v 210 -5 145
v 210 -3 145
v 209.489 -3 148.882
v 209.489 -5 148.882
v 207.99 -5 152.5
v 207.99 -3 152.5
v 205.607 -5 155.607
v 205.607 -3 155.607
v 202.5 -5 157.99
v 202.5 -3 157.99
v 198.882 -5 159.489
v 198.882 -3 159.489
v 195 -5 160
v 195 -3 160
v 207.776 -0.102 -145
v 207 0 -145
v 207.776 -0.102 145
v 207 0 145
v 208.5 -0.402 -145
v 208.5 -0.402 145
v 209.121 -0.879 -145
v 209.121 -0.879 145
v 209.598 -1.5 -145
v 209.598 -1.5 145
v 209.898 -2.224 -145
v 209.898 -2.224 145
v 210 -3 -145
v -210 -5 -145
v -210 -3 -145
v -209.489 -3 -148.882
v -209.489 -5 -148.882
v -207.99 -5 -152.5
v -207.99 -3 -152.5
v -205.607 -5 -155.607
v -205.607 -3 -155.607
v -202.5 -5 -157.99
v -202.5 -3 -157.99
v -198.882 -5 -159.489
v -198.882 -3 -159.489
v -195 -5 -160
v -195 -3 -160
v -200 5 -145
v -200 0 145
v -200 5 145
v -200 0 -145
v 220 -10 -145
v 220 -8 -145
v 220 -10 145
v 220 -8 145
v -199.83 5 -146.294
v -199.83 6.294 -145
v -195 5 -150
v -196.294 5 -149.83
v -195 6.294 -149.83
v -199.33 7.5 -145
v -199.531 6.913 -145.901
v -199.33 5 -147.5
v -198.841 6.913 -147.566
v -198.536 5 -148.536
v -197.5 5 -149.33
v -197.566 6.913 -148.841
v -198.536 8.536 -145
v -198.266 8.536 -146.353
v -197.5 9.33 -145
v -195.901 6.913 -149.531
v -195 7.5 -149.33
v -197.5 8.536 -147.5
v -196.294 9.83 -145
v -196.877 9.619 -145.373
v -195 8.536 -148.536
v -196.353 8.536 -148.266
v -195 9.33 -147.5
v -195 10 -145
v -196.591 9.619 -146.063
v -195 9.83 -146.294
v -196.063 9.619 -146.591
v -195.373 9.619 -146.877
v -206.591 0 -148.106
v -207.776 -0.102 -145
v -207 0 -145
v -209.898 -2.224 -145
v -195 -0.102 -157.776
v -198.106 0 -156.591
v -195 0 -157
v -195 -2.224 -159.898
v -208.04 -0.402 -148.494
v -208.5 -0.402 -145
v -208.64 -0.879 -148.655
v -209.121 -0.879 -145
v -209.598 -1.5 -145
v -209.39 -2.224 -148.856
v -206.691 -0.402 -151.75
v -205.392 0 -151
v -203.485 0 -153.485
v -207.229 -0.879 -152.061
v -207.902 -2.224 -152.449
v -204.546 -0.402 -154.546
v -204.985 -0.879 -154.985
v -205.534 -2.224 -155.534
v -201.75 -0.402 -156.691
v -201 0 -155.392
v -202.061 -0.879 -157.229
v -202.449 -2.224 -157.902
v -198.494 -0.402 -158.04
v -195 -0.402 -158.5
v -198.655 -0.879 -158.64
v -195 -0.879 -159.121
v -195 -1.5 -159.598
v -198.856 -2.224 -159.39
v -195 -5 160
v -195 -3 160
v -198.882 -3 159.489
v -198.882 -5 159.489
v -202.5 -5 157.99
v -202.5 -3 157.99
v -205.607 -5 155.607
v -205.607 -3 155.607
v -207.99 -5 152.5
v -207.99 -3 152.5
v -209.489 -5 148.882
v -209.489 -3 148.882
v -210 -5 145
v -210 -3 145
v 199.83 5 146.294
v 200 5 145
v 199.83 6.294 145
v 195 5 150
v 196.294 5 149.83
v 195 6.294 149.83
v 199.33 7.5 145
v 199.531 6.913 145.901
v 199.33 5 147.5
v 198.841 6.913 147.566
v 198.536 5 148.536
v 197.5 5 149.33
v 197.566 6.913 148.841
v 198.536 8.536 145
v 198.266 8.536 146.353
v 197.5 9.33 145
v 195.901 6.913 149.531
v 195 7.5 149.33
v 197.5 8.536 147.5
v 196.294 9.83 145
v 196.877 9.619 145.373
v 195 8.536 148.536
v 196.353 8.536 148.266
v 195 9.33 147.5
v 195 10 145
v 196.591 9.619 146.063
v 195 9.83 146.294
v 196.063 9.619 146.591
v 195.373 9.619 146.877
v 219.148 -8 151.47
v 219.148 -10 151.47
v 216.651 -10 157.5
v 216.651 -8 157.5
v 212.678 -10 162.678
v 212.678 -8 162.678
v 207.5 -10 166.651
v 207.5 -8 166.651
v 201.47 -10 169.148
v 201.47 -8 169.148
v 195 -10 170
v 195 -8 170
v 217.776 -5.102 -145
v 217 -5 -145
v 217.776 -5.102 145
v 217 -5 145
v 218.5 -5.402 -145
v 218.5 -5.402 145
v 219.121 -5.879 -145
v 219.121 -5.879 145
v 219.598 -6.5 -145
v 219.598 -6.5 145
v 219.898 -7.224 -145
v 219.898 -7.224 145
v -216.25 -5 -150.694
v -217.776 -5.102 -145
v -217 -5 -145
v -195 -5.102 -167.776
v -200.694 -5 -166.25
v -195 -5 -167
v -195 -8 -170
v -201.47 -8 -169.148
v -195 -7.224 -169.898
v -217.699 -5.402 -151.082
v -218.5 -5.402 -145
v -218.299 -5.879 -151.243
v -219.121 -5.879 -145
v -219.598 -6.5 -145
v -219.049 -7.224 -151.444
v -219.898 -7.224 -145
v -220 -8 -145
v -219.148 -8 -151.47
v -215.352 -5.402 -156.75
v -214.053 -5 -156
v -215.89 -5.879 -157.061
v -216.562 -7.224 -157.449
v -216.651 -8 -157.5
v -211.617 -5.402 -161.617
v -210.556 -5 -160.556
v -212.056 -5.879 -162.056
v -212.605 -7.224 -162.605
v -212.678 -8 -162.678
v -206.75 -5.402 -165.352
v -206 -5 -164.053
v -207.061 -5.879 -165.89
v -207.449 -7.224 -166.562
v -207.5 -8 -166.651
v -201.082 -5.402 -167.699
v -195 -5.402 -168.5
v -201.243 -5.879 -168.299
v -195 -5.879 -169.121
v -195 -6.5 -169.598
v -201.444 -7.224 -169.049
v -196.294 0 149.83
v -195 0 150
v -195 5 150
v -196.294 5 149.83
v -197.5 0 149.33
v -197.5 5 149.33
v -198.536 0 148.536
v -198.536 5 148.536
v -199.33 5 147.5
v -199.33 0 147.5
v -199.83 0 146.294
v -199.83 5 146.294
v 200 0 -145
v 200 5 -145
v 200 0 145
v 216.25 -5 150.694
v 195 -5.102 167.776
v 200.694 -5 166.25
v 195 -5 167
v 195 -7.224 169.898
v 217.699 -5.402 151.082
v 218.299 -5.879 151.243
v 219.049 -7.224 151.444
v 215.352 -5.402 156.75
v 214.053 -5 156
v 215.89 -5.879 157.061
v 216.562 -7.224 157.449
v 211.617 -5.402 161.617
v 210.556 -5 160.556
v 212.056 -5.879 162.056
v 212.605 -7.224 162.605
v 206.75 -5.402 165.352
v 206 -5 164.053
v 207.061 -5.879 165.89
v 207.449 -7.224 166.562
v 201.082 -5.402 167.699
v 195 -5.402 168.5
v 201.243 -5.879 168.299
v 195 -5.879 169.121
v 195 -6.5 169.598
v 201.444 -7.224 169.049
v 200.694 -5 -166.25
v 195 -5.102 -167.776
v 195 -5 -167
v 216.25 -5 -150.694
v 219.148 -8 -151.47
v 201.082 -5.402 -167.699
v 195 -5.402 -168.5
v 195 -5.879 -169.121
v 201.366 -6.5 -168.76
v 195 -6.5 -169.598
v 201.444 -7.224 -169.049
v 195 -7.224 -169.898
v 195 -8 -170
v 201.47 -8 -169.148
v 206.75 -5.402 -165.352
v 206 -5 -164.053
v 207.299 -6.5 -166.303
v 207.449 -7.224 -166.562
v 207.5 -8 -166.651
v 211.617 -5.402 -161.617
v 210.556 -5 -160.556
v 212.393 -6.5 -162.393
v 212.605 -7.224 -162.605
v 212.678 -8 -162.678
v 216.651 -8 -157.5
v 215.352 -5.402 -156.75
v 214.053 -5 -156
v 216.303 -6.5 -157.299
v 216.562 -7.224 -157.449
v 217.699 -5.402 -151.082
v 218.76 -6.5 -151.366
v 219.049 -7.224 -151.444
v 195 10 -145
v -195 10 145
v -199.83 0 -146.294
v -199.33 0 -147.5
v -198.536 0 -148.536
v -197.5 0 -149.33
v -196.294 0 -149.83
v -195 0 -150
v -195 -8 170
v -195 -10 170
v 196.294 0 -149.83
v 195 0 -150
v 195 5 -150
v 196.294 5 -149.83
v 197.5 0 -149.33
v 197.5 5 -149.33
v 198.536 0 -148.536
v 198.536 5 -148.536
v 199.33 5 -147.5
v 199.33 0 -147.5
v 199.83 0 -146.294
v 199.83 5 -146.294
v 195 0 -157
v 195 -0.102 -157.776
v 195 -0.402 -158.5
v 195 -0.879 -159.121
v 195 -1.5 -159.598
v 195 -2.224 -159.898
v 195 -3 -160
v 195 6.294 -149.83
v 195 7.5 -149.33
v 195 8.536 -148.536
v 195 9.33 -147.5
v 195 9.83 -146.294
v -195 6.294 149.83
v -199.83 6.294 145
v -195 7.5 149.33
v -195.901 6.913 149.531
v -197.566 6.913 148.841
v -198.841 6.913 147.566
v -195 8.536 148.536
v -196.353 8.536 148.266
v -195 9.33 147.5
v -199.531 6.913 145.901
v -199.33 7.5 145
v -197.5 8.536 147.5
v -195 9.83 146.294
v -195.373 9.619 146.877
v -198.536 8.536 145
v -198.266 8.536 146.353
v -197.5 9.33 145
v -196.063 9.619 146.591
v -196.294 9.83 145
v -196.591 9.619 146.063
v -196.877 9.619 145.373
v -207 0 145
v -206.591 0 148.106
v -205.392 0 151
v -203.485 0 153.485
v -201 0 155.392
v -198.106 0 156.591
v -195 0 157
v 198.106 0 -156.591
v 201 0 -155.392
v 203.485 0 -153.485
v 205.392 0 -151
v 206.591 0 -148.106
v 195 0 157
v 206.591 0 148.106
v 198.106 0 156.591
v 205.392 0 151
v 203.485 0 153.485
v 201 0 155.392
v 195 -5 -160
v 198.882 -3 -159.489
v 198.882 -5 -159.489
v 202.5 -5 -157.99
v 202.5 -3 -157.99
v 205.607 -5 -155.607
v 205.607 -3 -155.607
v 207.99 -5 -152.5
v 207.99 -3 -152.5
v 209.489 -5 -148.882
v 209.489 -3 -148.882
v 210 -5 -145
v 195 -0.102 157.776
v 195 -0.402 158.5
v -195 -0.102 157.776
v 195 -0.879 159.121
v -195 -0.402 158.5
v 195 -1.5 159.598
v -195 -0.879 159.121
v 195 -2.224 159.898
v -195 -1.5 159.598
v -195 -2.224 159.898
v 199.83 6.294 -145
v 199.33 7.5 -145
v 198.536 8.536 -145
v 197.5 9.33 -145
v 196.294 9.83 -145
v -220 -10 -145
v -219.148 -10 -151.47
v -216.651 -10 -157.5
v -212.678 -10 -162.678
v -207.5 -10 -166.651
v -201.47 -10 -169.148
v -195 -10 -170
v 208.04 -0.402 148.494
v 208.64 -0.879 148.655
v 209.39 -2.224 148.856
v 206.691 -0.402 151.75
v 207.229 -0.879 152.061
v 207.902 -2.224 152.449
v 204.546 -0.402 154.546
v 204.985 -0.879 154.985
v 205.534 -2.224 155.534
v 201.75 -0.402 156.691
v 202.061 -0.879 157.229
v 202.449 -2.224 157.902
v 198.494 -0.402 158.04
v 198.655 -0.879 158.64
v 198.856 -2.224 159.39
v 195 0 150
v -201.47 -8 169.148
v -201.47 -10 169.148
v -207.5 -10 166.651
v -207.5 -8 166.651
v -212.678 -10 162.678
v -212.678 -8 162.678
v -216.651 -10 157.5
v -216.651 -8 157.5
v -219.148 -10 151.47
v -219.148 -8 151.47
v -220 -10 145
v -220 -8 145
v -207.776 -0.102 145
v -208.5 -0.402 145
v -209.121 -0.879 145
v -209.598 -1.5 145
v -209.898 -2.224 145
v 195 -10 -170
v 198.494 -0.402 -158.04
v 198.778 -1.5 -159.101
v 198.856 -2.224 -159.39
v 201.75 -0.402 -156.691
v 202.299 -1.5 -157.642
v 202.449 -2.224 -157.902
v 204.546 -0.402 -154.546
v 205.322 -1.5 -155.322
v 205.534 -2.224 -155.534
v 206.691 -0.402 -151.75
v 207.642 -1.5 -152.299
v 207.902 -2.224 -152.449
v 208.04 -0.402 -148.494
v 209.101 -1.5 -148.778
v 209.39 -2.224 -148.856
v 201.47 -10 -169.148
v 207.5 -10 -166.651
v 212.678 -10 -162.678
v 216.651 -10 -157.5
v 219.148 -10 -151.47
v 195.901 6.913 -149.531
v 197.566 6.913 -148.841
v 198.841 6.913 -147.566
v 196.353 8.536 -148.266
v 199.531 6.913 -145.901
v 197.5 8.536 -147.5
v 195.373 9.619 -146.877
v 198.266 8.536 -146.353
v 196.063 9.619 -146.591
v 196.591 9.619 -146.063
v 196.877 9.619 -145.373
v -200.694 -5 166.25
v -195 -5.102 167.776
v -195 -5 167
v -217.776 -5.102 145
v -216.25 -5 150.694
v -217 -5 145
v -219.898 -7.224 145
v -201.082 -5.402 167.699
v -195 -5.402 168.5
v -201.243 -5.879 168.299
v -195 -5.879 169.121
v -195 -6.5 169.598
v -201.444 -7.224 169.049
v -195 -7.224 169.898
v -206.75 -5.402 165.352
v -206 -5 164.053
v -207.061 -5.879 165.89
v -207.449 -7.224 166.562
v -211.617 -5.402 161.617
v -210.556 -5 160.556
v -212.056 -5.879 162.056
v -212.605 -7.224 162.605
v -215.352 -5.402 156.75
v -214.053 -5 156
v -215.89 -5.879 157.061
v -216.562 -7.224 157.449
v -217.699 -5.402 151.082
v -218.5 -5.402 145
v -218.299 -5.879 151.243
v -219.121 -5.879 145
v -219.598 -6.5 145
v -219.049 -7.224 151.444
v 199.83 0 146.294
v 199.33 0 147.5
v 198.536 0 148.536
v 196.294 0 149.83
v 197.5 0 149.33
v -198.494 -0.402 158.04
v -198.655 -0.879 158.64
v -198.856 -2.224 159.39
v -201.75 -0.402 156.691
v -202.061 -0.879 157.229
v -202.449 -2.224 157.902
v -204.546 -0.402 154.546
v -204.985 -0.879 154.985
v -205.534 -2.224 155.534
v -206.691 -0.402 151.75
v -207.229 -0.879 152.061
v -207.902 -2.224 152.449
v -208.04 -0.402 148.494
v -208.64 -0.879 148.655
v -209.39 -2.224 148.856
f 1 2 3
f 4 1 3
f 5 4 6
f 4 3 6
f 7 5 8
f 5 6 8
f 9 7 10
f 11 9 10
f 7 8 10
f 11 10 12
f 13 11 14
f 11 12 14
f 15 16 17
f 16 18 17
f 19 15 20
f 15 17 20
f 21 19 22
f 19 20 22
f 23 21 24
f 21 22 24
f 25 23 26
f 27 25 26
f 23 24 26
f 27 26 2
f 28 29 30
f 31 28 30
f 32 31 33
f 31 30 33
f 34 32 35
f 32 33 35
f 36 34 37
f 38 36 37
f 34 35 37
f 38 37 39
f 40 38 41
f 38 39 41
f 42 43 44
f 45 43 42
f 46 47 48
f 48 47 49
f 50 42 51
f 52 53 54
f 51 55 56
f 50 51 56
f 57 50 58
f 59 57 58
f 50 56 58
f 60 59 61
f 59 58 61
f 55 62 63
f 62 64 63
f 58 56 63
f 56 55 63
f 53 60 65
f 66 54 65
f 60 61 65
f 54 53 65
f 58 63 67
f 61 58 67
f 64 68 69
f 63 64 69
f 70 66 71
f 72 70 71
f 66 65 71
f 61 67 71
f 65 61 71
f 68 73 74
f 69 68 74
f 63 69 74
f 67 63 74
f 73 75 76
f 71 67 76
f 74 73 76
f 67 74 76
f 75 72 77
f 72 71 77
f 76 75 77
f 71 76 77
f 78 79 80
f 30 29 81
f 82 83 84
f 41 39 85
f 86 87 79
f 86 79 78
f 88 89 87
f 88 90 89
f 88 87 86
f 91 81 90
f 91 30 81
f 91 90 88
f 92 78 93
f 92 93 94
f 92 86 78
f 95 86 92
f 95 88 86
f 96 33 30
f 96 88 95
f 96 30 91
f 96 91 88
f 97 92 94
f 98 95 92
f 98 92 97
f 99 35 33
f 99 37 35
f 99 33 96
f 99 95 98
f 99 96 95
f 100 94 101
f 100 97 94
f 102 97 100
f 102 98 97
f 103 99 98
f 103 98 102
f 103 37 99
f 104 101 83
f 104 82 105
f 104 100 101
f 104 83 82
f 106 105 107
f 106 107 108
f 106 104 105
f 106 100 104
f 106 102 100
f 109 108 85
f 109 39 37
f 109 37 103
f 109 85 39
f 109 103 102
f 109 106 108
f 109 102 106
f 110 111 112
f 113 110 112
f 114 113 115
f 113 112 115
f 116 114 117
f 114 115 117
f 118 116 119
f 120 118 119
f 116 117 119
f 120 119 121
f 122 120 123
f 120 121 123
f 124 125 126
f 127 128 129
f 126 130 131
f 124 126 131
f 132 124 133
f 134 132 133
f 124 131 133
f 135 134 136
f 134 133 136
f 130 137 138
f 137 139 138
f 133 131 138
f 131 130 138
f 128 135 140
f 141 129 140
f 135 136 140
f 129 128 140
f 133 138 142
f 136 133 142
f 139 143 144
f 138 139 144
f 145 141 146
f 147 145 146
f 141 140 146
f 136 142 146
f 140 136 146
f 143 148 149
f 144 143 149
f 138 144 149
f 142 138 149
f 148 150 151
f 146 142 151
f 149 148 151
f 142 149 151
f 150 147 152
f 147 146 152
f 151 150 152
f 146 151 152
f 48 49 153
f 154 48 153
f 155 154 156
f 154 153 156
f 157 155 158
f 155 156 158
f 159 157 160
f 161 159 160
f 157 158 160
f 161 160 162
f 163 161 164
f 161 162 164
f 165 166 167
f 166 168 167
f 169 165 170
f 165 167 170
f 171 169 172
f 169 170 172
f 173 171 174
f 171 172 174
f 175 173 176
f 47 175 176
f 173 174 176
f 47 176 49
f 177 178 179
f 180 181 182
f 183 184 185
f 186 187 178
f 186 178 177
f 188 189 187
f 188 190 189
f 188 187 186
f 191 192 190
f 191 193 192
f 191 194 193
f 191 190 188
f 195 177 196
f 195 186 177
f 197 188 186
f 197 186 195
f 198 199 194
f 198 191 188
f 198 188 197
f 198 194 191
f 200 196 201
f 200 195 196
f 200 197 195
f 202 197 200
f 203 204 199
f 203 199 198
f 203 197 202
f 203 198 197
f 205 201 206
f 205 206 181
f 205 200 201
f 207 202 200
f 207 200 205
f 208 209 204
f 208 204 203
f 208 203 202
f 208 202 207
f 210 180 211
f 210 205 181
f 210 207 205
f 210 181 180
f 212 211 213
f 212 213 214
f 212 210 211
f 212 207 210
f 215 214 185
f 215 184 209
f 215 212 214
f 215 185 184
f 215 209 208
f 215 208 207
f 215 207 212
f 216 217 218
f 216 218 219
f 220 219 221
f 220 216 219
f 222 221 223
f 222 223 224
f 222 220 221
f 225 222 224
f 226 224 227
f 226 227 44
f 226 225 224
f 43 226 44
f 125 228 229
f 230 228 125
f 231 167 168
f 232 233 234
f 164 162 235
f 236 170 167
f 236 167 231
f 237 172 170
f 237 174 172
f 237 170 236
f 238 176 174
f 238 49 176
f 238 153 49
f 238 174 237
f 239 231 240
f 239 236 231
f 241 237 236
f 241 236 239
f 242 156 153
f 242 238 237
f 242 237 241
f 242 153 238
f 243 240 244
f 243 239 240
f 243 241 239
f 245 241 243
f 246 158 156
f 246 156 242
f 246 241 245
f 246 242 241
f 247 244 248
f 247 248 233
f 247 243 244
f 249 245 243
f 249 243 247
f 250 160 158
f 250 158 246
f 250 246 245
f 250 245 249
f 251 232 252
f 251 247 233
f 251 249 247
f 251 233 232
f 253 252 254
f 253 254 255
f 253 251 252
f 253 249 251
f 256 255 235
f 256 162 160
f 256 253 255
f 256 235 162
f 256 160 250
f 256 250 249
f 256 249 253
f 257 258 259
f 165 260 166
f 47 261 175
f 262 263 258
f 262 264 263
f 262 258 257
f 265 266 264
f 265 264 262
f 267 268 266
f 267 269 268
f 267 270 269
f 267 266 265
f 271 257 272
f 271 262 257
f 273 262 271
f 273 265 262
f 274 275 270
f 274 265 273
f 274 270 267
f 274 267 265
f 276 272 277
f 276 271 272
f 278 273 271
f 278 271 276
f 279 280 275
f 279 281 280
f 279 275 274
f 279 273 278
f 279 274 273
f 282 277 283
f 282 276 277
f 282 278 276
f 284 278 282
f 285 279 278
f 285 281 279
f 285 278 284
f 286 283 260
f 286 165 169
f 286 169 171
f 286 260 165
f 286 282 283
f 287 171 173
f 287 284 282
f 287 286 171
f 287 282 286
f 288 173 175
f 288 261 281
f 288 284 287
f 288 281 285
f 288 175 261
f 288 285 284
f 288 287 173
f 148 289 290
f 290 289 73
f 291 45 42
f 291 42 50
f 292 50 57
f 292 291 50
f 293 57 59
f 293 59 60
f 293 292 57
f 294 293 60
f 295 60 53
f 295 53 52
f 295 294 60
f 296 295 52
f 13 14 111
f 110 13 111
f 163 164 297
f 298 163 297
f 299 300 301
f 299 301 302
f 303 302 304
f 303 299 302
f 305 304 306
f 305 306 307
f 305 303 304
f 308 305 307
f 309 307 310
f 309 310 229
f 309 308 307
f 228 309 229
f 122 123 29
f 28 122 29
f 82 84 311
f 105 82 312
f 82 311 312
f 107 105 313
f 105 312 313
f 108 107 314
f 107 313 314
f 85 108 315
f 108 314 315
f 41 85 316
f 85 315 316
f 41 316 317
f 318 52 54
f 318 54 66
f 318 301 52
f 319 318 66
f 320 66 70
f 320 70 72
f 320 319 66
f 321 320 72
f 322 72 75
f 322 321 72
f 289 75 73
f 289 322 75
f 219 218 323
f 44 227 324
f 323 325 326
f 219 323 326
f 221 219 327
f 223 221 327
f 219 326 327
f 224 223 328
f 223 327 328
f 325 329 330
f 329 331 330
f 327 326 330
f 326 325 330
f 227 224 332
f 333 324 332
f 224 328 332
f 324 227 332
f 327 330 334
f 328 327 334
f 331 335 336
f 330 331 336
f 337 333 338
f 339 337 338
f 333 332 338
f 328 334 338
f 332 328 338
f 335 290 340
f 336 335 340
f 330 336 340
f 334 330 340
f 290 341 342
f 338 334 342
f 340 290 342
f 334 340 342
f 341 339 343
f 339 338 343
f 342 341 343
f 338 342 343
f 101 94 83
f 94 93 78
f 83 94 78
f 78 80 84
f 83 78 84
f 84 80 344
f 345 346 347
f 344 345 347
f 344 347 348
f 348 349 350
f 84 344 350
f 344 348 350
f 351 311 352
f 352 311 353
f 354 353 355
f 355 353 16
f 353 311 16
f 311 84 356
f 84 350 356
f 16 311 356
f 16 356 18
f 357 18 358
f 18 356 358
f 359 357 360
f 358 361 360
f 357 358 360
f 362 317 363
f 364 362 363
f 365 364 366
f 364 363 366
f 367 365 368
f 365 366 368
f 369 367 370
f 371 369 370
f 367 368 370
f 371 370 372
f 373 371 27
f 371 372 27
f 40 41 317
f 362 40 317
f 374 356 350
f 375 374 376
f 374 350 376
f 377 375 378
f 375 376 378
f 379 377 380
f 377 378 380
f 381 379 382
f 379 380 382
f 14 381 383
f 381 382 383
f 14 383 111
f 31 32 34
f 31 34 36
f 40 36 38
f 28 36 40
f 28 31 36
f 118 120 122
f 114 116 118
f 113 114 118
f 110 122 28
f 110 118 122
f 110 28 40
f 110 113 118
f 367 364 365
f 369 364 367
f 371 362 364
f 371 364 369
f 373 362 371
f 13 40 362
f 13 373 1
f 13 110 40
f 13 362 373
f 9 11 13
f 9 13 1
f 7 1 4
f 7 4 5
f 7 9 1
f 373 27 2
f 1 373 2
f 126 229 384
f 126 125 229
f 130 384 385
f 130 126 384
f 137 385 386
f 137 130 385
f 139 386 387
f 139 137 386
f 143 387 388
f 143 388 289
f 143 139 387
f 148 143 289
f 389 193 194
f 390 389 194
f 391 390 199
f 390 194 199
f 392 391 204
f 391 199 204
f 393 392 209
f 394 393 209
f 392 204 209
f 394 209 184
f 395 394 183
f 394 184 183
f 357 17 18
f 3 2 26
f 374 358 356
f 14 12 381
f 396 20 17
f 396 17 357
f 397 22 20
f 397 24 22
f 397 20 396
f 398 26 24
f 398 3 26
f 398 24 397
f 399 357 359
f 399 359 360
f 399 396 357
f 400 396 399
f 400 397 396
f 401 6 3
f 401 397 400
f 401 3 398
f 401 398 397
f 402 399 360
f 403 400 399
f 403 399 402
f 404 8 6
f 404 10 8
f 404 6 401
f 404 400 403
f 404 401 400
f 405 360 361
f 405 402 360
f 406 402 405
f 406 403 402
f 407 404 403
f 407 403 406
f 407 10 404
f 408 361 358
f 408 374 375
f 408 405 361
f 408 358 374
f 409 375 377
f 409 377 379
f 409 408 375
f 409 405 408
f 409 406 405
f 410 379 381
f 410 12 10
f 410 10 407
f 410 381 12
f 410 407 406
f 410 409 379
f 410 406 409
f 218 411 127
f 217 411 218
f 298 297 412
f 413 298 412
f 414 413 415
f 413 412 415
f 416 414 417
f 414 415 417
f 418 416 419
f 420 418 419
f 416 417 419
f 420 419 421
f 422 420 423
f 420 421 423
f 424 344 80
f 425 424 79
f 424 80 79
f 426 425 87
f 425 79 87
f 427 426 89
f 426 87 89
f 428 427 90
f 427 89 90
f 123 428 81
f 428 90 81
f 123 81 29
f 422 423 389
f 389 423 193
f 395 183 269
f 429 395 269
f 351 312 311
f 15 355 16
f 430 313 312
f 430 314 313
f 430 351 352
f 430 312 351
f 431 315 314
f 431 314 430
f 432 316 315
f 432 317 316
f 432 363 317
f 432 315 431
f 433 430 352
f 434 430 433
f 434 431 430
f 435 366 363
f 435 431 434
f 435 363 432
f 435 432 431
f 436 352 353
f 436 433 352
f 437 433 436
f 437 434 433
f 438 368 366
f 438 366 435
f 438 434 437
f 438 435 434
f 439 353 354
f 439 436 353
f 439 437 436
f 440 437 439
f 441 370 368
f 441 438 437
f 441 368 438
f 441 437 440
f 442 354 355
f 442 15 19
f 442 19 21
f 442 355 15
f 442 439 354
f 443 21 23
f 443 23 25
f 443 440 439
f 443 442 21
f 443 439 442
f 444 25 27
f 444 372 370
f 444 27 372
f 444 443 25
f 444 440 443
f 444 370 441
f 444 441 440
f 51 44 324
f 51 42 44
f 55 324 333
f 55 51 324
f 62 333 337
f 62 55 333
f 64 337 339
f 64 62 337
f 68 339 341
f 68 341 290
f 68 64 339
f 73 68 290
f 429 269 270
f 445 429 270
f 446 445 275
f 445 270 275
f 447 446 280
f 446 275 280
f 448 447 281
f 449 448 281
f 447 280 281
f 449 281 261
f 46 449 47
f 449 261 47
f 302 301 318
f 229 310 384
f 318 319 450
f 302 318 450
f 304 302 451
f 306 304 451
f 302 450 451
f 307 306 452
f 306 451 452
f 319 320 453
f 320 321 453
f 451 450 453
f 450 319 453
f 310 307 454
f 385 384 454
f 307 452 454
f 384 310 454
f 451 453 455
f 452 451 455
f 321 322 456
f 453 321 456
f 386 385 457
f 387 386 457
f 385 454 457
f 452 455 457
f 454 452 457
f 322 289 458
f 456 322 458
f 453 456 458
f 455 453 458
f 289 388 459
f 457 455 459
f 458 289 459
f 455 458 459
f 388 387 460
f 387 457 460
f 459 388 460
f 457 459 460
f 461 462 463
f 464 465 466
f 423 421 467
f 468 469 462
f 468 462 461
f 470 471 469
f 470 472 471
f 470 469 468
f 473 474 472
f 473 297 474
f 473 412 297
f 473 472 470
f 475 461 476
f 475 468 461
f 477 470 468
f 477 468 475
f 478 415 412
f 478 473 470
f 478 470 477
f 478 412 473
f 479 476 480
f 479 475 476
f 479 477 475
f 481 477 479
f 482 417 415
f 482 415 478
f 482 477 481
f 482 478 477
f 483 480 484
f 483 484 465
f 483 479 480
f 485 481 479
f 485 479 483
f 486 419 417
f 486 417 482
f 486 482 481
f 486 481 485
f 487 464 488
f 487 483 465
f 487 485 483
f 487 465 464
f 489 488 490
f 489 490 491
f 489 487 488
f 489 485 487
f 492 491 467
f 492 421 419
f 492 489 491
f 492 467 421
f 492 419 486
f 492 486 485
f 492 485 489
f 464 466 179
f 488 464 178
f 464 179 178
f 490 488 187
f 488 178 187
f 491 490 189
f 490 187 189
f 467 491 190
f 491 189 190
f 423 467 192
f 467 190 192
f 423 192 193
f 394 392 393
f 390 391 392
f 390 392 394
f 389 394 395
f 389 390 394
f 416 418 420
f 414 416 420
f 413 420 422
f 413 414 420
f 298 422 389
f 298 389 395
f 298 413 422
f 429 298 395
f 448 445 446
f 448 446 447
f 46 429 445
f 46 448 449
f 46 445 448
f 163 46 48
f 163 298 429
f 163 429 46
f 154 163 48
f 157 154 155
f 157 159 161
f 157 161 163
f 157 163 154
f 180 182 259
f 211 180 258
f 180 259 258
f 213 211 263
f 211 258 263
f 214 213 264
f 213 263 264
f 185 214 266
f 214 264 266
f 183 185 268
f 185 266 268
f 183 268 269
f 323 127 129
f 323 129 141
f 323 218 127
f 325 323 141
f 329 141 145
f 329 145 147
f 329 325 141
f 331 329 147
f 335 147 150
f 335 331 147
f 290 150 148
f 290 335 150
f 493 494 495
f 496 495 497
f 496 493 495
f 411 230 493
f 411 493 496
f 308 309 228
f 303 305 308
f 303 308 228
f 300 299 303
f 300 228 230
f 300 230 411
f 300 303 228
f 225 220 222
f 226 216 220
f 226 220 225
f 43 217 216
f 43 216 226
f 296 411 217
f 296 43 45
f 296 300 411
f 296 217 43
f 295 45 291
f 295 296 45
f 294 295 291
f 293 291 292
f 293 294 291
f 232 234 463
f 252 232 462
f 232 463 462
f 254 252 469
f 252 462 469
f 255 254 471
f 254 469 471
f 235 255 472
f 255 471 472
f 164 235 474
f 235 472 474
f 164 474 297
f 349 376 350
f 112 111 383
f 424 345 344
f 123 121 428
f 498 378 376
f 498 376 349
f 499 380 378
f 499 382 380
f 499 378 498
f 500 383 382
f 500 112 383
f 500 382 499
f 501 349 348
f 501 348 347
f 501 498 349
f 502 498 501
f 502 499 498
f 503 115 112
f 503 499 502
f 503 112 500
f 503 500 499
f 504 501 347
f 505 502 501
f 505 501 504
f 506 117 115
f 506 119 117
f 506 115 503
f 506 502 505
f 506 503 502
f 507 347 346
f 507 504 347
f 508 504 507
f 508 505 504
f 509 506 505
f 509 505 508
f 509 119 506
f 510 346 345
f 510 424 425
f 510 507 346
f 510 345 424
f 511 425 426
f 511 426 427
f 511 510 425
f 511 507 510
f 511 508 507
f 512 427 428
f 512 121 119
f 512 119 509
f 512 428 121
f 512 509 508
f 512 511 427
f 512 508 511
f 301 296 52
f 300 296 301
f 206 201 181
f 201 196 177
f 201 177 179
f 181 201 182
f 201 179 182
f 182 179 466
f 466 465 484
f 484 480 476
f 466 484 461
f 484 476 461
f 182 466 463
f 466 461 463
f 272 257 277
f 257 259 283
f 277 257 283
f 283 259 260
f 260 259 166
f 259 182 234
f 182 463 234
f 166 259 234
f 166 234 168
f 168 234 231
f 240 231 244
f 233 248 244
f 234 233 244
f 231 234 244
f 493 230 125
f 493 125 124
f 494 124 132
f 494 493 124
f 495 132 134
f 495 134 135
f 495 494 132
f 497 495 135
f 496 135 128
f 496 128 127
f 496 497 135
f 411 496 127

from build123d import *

# Parameters (mm, degrees)
BOSS_EXTRUDE1_DEPTH = 10
FILLET1_R           = 5
BOSS_EXTRUDE2_DEPTH = 5
BOSS_EXTRUDE3_DEPTH = 5
FILLET2_R           = 3
FILLET3_R           = 3


with BuildPart() as part:
    # Sketch3 → Boss-Extrude1 (new body)
    with BuildSketch(Plane(origin=(0, 0, 0), x_dir=(1, 0, 0), z_dir=(0, 1, 0))):
        with BuildLine():
            Line((195, -150), (-195, -150))
            ThreePointArc((-195, -150), (-198.535533906, -148.535533906), (-200, -145))
            Line((-200, -145), (-200, 145))
            ThreePointArc((-200, 145), (-198.535533906, 148.535533906), (-195, 150))
            Line((-195, 150), (195, 150))
            ThreePointArc((195, 150), (198.535533906, 148.535533906), (200, 145))
            Line((200, 145), (200, -145))
            ThreePointArc((200, -145), (198.535533906, -148.535533906), (195, -150))
        make_face()
    extrude(amount=BOSS_EXTRUDE1_DEPTH)

    # Fillet1
    fillet1_edges = [part.edges().sort_by_distance(p)[0] for p in [
        (198.535533906, 10, 148.535533906),
        (200, 10, 0),
        (198.535533906, 10, -148.535533906),
        (0, 10, -150),
        (-198.535533906, 10, -148.535533906),
        (-200, 10, 0),
        (-198.535533906, 10, 148.535533906),
        (0, 10, 150),
    ]]
    fillet(fillet1_edges, radius=FILLET1_R)


with BuildPart() as body_2:
    # Sketch4 → Boss-Extrude2 (new body)
    # profile 1 of 3: a face of its own
    with BuildSketch(Plane.XZ):
        with BuildLine():
            Line((195, 160), (-195, 160))
            ThreePointArc((-195, 160), (-205.606601718, 155.606601718), (-210, 145))
            Line((-210, 145), (-210, -145))
            ThreePointArc((-210, -145), (-205.606601718, -155.606601718), (-195, -160))
            Line((-195, -160), (195, -160))
            ThreePointArc((195, -160), (205.606601718, -155.606601718), (210, -145))
            Line((210, -145), (210, 145))
            ThreePointArc((210, 145), (205.606601718, 155.606601718), (195, 160))
        make_face()
        with BuildLine():
            ThreePointArc((-195, 150), (-198.535533906, 148.535533906), (-200, 145))
            Line((-200, 145), (-200, -145))
            ThreePointArc((-200, -145), (-198.535533906, -148.535533906), (-195, -150))
            Line((-195, -150), (195, -150))
            ThreePointArc((195, -150), (198.535533906, -148.535533906), (200, -145))
            Line((200, -145), (200, 145))
            ThreePointArc((200, 145), (198.535533906, 148.535533906), (195, 150))
            Line((195, 150), (-195, 150))
        make_face(mode=Mode.SUBTRACT)
    # profile 2 of 3: a face of its own
    with BuildSketch(Plane.XZ):
        with BuildLine():
            Line((195, 150), (-195, 150))
            ThreePointArc((-195, 150), (-198.535533906, 148.535533906), (-200, 145))
            Line((-200, 145), (-200, -145))
            ThreePointArc((-200, -145), (-198.535533906, -148.535533906), (-195, -150))
            Line((-195, -150), (195, -150))
            ThreePointArc((195, -150), (198.535533906, -148.535533906), (200, -145))
            Line((200, -145), (200, 145))
            ThreePointArc((200, 145), (198.535533906, 148.535533906), (195, 150))
        make_face()
    # profile 3 of 3: a face of its own
    with BuildSketch(Plane.XZ):
        with BuildLine():
            ThreePointArc((-195, 150), (-198.535533906, 148.535533906), (-200, 145))
            Line((-200, 145), (-200, -145))
            ThreePointArc((-200, -145), (-198.535533906, -148.535533906), (-195, -150))
            Line((-195, -150), (195, -150))
            ThreePointArc((195, -150), (198.535533906, -148.535533906), (200, -145))
            Line((200, -145), (200, 145))
            ThreePointArc((200, 145), (198.535533906, 148.535533906), (195, 150))
            Line((195, 150), (-195, 150))
        make_face()
    extrude(amount=BOSS_EXTRUDE2_DEPTH)

    # Fillet2
    fillet2_edges = [body_2.edges().sort_by_distance(p)[0] for p in [
        (210, 0, 0),
        (205.606601718, 0, -155.606601718),
        (0, 0, -160),
        (-205.606601718, 0, -155.606601718),
        (-210, 0, 0),
        (-205.606601718, 0, 155.606601718),
        (0, 0, 160),
        (205.606601718, 0, 155.606601718),
    ]]
    fillet(fillet2_edges, radius=FILLET2_R)


with BuildPart() as body_3:
    # Sketch5 → Boss-Extrude3 (new body)
    # profile 1 of 3: a face of its own
    with BuildSketch(Plane.XZ.offset(5)):
        with BuildLine():
            Line((195, 170), (-195, 170))
            ThreePointArc((-195, 170), (-212.67766953, 162.67766953), (-220, 145))
            Line((-220, 145), (-220, -145))
            ThreePointArc((-220, -145), (-212.67766953, -162.67766953), (-195, -170))
            Line((-195, -170), (195, -170))
            ThreePointArc((195, -170), (212.67766953, -162.67766953), (220, -145))
            Line((220, -145), (220, 145))
            ThreePointArc((220, 145), (212.67766953, 162.67766953), (195, 170))
        make_face()
        with BuildLine():
            Line((195, 160), (-195, 160))
            ThreePointArc((-195, 160), (-205.606601718, 155.606601718), (-210, 145))
            Line((-210, 145), (-210, -145))
            ThreePointArc((-210, -145), (-205.606601718, -155.606601718), (-195, -160))
            Line((-195, -160), (195, -160))
            ThreePointArc((195, -160), (205.606601718, -155.606601718), (210, -145))
            Line((210, -145), (210, 145))
            ThreePointArc((210, 145), (205.606601718, 155.606601718), (195, 160))
        make_face(mode=Mode.SUBTRACT)
    # profile 2 of 3: a face of its own
    with BuildSketch(Plane.XZ.offset(5)):
        with BuildLine():
            ThreePointArc((210, 145), (205.606601718, 155.606601718), (195, 160))
            Line((195, 160), (-195, 160))
            ThreePointArc((-195, 160), (-205.606601718, 155.606601718), (-210, 145))
            Line((-210, 145), (-210, -145))
            ThreePointArc((-210, -145), (-205.606601718, -155.606601718), (-195, -160))
            Line((-195, -160), (195, -160))
            ThreePointArc((195, -160), (205.606601718, -155.606601718), (210, -145))
            Line((210, -145), (210, 145))
        make_face()
    # profile 3 of 3: a face of its own
    with BuildSketch(Plane.XZ.offset(5)):
        with BuildLine():
            Line((195, 160), (-195, 160))
            ThreePointArc((-195, 160), (-205.606601718, 155.606601718), (-210, 145))
            Line((-210, 145), (-210, -145))
            ThreePointArc((-210, -145), (-205.606601718, -155.606601718), (-195, -160))
            Line((-195, -160), (195, -160))
            ThreePointArc((195, -160), (205.606601718, -155.606601718), (210, -145))
            Line((210, -145), (210, 145))
            ThreePointArc((210, 145), (205.606601718, 155.606601718), (195, 160))
        make_face()
    extrude(amount=BOSS_EXTRUDE3_DEPTH)

    # Fillet3
    fillet3_edges = [body_3.edges().sort_by_distance(p)[0] for p in [
        (220, -5, 0),
        (212.67766953, -5, -162.67766953),
        (0, -5, -170),
        (-212.67766953, -5, -162.67766953),
        (-220, -5, 0),
        (-212.67766953, -5, 162.67766953),
        (0, -5, 170),
        (212.67766953, -5, 162.67766953),
    ]]
    fillet(fillet3_edges, radius=FILLET3_R)


solid = Compound([part.part, body_2.part, body_3.part])
